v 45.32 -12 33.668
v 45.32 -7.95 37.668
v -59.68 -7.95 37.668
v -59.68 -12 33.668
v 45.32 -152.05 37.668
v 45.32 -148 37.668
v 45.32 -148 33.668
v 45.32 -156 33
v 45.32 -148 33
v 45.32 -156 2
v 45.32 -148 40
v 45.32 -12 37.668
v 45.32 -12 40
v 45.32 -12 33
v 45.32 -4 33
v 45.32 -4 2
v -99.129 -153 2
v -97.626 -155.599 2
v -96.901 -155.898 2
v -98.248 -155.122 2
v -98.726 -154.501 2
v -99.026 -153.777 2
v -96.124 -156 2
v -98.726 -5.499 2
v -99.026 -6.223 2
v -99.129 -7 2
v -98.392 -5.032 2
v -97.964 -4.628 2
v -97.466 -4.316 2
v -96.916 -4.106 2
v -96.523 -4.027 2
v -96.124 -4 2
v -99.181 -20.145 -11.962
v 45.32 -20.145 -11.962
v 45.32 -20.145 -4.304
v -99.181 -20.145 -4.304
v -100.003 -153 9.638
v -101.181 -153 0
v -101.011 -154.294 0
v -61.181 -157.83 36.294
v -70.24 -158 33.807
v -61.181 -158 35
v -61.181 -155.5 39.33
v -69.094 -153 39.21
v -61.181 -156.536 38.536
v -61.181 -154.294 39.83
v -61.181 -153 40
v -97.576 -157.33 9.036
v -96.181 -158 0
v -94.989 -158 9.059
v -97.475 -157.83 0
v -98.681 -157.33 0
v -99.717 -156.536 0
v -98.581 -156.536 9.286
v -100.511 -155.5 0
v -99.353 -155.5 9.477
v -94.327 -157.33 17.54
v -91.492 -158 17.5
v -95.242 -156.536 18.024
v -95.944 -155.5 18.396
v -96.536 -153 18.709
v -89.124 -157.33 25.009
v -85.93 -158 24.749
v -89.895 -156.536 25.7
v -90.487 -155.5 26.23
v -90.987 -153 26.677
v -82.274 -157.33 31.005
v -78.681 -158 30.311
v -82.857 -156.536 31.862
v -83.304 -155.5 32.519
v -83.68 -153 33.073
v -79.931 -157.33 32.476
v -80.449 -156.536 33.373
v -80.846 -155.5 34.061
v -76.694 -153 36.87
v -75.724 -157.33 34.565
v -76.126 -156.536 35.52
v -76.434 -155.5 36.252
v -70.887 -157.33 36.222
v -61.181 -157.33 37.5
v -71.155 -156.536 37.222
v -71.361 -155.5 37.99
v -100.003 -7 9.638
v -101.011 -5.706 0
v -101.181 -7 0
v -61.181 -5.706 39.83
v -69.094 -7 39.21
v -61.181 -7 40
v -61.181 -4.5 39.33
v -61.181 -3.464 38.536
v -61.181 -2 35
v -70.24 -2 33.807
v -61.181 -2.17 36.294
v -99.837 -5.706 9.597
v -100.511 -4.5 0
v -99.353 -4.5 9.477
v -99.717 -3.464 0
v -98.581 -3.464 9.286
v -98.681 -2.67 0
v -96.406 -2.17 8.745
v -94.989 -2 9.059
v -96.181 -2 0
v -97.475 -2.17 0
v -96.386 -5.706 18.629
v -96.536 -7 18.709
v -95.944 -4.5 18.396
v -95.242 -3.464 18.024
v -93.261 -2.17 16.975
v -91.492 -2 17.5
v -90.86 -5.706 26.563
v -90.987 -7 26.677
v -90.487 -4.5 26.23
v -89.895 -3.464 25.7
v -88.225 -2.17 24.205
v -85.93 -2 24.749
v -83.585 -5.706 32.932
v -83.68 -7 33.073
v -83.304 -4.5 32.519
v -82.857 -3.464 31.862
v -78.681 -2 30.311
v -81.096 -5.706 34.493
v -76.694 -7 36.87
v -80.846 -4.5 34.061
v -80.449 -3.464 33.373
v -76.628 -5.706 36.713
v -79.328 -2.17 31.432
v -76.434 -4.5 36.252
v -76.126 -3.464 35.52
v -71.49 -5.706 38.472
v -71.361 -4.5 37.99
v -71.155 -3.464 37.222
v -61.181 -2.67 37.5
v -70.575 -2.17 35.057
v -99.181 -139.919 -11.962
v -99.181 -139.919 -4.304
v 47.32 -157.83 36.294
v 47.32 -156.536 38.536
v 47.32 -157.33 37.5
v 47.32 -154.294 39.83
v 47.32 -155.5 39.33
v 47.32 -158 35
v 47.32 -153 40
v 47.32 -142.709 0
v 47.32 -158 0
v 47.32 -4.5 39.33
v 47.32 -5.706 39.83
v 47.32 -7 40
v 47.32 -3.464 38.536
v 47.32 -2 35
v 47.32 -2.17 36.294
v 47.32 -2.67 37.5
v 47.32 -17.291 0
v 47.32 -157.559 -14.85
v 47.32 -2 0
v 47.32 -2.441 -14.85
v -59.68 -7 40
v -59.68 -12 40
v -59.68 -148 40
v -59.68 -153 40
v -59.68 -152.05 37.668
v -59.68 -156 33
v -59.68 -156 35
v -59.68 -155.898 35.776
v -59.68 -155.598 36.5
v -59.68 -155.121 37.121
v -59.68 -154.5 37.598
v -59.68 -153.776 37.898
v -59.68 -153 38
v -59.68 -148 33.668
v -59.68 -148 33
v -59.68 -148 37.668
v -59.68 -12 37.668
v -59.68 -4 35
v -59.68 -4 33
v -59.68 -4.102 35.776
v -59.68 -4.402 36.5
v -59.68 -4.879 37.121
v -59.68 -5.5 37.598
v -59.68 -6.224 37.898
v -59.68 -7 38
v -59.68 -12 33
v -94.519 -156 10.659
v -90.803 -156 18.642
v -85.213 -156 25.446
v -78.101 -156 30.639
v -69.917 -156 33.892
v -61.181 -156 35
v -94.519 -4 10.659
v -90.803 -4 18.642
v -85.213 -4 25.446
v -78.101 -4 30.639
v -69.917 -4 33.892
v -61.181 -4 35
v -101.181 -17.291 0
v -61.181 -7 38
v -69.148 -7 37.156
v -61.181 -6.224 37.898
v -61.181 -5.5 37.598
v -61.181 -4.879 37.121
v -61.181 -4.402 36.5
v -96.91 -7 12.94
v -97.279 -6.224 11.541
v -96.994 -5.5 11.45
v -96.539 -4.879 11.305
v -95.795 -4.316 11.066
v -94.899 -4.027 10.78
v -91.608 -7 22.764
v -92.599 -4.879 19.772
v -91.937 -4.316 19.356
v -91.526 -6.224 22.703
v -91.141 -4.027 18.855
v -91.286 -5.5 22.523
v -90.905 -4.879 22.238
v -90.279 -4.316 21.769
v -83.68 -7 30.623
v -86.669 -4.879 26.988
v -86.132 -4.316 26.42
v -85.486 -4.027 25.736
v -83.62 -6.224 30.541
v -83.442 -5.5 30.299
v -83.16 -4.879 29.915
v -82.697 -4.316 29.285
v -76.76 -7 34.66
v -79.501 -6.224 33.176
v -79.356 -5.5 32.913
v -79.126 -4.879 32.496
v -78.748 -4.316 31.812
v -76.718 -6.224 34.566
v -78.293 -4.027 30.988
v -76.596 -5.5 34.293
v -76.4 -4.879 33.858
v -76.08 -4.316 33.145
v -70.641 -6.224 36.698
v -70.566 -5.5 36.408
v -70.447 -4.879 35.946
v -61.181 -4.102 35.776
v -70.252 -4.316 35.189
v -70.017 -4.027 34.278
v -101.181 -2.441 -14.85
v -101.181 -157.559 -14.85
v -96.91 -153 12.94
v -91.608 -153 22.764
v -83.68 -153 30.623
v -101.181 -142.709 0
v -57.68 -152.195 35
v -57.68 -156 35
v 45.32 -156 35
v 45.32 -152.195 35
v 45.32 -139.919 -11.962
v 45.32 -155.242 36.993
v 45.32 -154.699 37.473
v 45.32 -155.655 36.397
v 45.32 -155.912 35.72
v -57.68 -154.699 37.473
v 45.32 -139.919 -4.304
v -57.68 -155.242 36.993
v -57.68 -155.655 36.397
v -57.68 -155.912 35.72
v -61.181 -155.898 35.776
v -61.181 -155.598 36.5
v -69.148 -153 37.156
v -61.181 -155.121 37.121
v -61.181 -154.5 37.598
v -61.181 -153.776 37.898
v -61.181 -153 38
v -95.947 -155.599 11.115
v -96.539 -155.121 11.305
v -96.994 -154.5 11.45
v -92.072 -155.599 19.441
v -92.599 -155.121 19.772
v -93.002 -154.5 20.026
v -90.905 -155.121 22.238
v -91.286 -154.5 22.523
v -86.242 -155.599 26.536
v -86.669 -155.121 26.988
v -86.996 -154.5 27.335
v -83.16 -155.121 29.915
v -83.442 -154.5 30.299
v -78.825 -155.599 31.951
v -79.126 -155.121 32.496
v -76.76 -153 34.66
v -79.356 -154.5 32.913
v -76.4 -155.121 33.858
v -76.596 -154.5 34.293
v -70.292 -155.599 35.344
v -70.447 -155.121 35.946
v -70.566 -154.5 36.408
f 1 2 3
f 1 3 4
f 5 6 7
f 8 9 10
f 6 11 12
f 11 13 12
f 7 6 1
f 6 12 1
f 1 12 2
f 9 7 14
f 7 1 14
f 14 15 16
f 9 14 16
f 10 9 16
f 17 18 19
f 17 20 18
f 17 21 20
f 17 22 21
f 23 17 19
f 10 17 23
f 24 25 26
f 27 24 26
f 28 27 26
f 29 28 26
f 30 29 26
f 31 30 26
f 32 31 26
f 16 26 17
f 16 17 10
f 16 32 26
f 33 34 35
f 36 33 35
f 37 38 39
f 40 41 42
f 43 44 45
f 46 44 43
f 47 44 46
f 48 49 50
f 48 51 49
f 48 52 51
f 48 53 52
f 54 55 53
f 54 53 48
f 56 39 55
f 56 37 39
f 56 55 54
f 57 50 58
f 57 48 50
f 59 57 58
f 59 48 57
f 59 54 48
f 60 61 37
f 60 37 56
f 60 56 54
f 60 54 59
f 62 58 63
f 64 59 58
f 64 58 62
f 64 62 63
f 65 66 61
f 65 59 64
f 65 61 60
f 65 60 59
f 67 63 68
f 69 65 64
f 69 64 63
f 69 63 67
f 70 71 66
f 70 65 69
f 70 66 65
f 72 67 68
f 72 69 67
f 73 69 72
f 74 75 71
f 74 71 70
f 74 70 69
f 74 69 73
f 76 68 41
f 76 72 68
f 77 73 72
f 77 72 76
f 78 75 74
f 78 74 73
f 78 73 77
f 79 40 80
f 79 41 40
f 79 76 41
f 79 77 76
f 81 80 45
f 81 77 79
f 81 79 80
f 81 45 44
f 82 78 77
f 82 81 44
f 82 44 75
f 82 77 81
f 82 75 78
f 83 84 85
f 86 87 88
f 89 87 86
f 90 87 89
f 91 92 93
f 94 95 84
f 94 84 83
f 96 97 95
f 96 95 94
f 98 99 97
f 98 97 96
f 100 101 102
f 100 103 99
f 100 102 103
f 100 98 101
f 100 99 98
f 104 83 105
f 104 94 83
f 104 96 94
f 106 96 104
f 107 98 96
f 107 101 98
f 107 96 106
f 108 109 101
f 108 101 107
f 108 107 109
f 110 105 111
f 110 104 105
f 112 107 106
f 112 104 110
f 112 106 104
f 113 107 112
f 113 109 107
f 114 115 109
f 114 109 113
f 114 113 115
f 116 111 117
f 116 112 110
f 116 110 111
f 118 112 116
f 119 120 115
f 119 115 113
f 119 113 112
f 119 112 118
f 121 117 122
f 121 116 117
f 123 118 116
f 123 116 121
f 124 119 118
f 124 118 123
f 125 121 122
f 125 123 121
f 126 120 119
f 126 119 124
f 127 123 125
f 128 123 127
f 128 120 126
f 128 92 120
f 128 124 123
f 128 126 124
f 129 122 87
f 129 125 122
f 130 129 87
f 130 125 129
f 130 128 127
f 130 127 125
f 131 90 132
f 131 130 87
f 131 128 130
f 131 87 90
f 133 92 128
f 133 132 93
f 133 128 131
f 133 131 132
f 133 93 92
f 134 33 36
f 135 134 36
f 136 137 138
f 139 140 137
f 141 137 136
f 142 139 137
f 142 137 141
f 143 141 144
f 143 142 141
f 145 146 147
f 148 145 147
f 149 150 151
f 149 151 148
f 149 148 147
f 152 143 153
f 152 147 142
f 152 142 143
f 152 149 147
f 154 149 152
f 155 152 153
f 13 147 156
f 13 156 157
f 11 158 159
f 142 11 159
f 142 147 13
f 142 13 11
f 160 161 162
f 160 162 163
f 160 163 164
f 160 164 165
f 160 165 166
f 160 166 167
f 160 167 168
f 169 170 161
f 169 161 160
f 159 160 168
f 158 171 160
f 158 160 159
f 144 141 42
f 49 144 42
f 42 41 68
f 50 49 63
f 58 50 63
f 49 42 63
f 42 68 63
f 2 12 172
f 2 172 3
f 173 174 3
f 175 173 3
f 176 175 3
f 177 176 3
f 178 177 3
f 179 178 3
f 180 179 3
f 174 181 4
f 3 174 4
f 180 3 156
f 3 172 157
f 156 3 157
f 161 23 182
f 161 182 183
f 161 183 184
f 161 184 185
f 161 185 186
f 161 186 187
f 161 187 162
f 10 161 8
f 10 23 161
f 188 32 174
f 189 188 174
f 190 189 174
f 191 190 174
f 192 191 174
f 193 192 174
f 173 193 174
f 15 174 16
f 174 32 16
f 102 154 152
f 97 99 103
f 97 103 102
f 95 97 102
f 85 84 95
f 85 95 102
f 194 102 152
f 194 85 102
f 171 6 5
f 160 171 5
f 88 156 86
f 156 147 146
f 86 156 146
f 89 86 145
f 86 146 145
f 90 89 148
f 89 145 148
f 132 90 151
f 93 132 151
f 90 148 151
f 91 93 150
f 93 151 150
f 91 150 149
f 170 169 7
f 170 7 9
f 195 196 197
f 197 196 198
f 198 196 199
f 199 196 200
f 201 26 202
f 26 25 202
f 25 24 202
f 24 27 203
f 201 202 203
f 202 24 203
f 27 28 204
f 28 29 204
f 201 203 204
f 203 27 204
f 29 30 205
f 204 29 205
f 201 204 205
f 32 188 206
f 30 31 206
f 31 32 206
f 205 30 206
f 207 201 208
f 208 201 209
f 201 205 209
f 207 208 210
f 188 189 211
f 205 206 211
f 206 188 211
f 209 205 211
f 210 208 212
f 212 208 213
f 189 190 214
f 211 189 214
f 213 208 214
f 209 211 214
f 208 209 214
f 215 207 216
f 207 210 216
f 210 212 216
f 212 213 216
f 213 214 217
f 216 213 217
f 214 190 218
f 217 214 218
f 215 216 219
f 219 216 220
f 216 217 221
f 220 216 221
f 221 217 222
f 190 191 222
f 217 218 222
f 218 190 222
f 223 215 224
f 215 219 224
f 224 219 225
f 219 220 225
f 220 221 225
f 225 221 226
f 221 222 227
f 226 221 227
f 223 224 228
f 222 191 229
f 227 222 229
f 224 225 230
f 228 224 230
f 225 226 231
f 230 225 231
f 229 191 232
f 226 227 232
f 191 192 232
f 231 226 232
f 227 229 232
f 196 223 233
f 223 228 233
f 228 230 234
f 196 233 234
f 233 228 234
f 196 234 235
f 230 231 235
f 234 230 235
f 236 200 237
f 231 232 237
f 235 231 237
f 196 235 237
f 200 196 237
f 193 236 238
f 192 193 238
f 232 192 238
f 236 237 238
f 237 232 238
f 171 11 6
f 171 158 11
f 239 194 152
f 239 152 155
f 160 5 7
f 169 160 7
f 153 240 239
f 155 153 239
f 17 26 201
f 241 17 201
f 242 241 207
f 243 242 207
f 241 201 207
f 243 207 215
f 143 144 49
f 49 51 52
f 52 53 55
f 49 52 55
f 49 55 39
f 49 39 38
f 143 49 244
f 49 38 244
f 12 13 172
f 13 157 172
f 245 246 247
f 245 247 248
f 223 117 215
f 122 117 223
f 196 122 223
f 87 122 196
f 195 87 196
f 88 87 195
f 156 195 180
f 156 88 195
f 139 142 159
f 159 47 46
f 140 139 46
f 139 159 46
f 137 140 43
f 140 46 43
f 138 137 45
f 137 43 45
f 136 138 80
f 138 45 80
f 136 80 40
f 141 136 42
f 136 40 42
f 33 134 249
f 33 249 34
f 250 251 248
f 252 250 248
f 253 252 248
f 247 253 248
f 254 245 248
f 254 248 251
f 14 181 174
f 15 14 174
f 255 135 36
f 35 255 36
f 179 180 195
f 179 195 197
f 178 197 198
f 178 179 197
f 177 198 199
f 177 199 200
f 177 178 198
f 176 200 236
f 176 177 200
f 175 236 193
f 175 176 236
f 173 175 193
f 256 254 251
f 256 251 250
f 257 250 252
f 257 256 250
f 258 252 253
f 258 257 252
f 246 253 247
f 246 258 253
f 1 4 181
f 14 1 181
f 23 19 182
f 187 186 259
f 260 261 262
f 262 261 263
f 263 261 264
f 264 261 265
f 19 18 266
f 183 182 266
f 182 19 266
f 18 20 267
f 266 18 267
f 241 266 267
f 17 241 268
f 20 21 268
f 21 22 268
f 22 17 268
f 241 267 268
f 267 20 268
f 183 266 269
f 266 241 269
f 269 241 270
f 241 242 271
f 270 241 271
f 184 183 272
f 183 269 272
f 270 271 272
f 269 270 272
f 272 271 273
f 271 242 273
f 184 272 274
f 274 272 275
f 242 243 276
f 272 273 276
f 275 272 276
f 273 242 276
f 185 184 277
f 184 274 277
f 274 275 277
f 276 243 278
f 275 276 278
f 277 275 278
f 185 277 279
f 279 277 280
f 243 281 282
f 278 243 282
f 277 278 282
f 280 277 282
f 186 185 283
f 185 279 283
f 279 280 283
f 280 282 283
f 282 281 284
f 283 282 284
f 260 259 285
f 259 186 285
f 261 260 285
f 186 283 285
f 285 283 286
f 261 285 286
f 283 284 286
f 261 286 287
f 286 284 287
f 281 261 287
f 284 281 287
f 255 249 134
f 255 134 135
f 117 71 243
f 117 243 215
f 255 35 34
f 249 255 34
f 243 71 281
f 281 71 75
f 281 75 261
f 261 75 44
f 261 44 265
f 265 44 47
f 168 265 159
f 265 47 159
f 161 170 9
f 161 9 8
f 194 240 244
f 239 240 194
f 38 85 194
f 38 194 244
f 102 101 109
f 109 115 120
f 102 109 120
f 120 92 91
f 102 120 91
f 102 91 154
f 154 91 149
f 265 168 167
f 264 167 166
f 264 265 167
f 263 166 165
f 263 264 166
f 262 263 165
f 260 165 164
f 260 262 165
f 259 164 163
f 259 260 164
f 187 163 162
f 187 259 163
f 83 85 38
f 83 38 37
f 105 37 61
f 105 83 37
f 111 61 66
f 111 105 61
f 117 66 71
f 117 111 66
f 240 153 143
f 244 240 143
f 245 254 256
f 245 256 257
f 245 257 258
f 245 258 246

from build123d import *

# Parameters (mm, degrees)
SKETCH1_W            = 148.500856602
SKETCH1_H            = 156
BOSS_EXTRUDE1_DEPTH  = 40
FILLET3_R            = 40
FILLET4_R            = 5
SHELL4_T             = -2
SKETCH19_W           = 131
SKETCH19_H           = 146
CUT_EXTRUDE8_DEPTH   = 10
SKETCH21_W           = 107
SKETCH21_H           = 2
BOSS_EXTRUDE7_DEPTH  = 5
BOSS_EXTRUDE8_START  = -107
BOSS_EXTRUDE8_DEPTH  = 107
CUT_EXTRUDE9_DEPTH   = 107
BOSS_EXTRUDE9_DEPTH  = 2
BOSS_EXTRUDE10_DEPTH = 15
CUT_EXTRUDE10_DEPTH  = 170
SHELL5_START         = -57.680419874
SHELL5_DEPTH         = 103
SKETCH29_W           = 7.658063704
SKETCH29_H           = 119.773909492
CUT_EXTRUDE11_DEPTH  = 170
SKETCH31_W           = 7.658063704
SKETCH31_H           = 119.773909492
BOSS_EXTRUDE12_DEPTH = 2
SKETCH32_W           = 7.658063704
SKETCH32_H           = 119.773909492
BOSS_EXTRUDE13_DEPTH = 2
CUT_EXTRUDE12_DEPTH  = 154


# Read off the part's stored shape, not the designer's step: Shell5
# Some blends are built 0.0001 mm under size
with BuildPart() as part:
    # Sketch1 → Boss-Extrude1 (new body)
    with BuildSketch(Plane.XY):
        with Locations((-26.930848175, -80)):
            Rectangle(SKETCH1_W, SKETCH1_H)
    extrude(amount=BOSS_EXTRUDE1_DEPTH)

    # Fillet3
    fillet3_edges = [part.edges().sort_by_distance(p)[0] for p in [
        (-101.181276476, -80, 40),
    ]]
    fillet(fillet3_edges, radius=FILLET3_R - 0.0001)  # a hair under: the kernel refuses the full size

    # Fillet4
    # the kernel refuses this fillet: 5 mm, written as the material it takes off along each edge
    with BuildSketch(Plane(origin=(-61.181376476, -158, 40), x_dir=(0, 1, 0), z_dir=(1, 0, 0))) as fillet4_piece_1:
        with BuildLine():
            CenterArc((FILLET4_R, -FILLET4_R), FILLET4_R, 90, 90)
            Line((0, -FILLET4_R), (0, 0))
            Line((0, 0), (FILLET4_R, 0))
        make_face()
    extrude(amount=121.000956602, mode=Mode.SUBTRACT)
    with BuildSketch(Plane(origin=(-61.181376476, -158, 0.0001), x_dir=(-1, 0, 0), z_dir=(0, 0, -1))) as fillet4_piece_2:
        with BuildLine():
            CenterArc((39.9999 - FILLET4_R, FILLET4_R), FILLET4_R, 270, 90)
            Line((39.9999 - FILLET4_R, 0), (39.9999, 0))
            Line((39.9999, 0), (39.9999, FILLET4_R))
        make_face()
    revolve(axis=Axis((-61.181376476, -158, 0.0001), (0, 1, 0)), revolution_arc=90, mode=Mode.SUBTRACT)
    with BuildSketch(Plane(origin=(-61.181376476, -2, 0.0001), x_dir=(-1, 0, 0), z_dir=(0, 0, -1))) as fillet4_piece_3:
        with BuildLine():
            CenterArc((39.9999 - FILLET4_R, -FILLET4_R), FILLET4_R, 0, 90)
            Line((39.9999, -FILLET4_R), (39.9999, 0))
            Line((39.9999, 0), (39.9999 - FILLET4_R, 0))
        make_face()
    revolve(axis=Axis((-61.181376476, -2, 0.0001), (0, 1, 0)), revolution_arc=90, mode=Mode.SUBTRACT)
    with BuildSketch(Plane(origin=(59.819580126, -2, 40), x_dir=(0, 0, -1), z_dir=(-1, 0, 0))) as fillet4_piece_4:
        with BuildLine():
            CenterArc((FILLET4_R, FILLET4_R), FILLET4_R, 180, 90)
            Line((0, FILLET4_R), (0, 0))
            Line((0, 0), (FILLET4_R, 0))
        make_face()
    extrude(amount=121.000956602, mode=Mode.SUBTRACT)
    with BuildSketch(Plane(origin=(-101.181276476, -2, -12.5), x_dir=(1, 0, 0), z_dir=(0, 0, 1)), Plane(origin=(-101.181276476, -158, -12.5), x_dir=(0, 1, 0), z_dir=(0, 0, 1))) as fillet4_piece_5:
        with BuildLine():
            CenterArc((FILLET4_R, -FILLET4_R), FILLET4_R, 90, 90)
            Line((0, -FILLET4_R), (0, 0))
            Line((0, 0), (FILLET4_R, 0))
        make_face()
    extrude(amount=12.5001, mode=Mode.SUBTRACT)

    # Shell4
    shell4_openings = [part.faces().sort_by_distance(p)[0] for p in [
        (47.319580126, -80, 19.967473228),
    ]]
    offset(amount=SHELL4_T, openings=shell4_openings)

    # Sketch19 → Cut-Extrude8 (cut)
    with BuildSketch(Plane.XY.offset(40)):
        with Locations((-18.180419874, -80)):
            Rectangle(SKETCH19_W, SKETCH19_H)
    extrude(amount=-CUT_EXTRUDE8_DEPTH, mode=Mode.SUBTRACT)

    # Sketch21 → Boss-Extrude7 (add)
    with BuildSketch(Plane(origin=(0, -153, 0), x_dir=(1, 0, 0), z_dir=(0, 1, 0))):
        with Locations((-6.180419874, -39)):
            Rectangle(SKETCH21_W, SKETCH21_H)
    boss_extrude7 = extrude(amount=BOSS_EXTRUDE7_DEPTH)

    # Sketch22 → Boss-Extrude8 (add)
    with BuildSketch(Plane(origin=(47.319580126, 0, 0), x_dir=(0, 0, -1), z_dir=(1, 0, 0)).offset(BOSS_EXTRUDE8_START)):
        with BuildLine():
            Line((-38, -148), (-33, -148))
            Line((-33, -148), (-33, -156))
            Line((-33, -156), (-35, -156))
            ThreePointArc((-35, -156), (-37.121320344, -155.121320344), (-38, -153))
            Line((-38, -153), (-38, -148))
        make_face()
    boss_extrude8 = extrude(amount=BOSS_EXTRUDE8_DEPTH)

    # Sketch23 → Cut-Extrude9 (cut)
    with BuildSketch(Plane(origin=(47.319580126, 0, 0), x_dir=(0, 0, -1), z_dir=(1, 0, 0))):
        Polygon((-37.667948512, -148), (-37.667948512, -152.05), (-33.667948512, -148), align=None)
    cut_extrude9 = extrude(amount=-CUT_EXTRUDE9_DEPTH, mode=Mode.SUBTRACT)

    # Mirror1: Boss-Extrude7, Boss-Extrude8, Cut-Extrude9 across plane
    add(boss_extrude7.mirror(Plane.ZX.offset(-80)))
    add(boss_extrude8.mirror(Plane.ZX.offset(-80)))
    add(cut_extrude9.mirror(Plane.ZX.offset(-80)), mode=Mode.SUBTRACT)

    # Sketch25 → Boss-Extrude9 (add)
    with BuildSketch(Plane(origin=(47.319580126, 0, 0), x_dir=(0, 0, -1), z_dir=(1, 0, 0))):
        Polygon((-40, -148), (-37.667948512, -148), (-37.667948512, -152.05), (-33.667948512, -148), (-33, -148), (-33, -156), (-2, -156), (-2, -4), (-33, -4), (-33, -12), (-33.667948512, -12), (-37.667948512, -7.95), (-37.667948512, -12), (-40, -12), align=None)
    extrude(amount=-BOSS_EXTRUDE9_DEPTH)

    # Sketch26 → Boss-Extrude10 (add)
    with BuildSketch(Plane(origin=(0, 0, 0), x_dir=(-1, 0, 0), z_dir=(0, 0, -1))):
        Polygon((101.181276476, -7), (101.181276476, -153), (101.181276476, -158), (96.181276476, -158), (-47.319580126, -158), (-47.319580126, -2), (96.181276476, -2), (101.181276476, -2), align=None)
    extrude(amount=BOSS_EXTRUDE10_DEPTH)

    # Sketch27 → Cut-Extrude10 (cut)
    with BuildSketch(Plane.ZY.offset(101.181276476)):
        Polygon((-15.241421356, -1.9), (0, -1.9), (0, -2), (0, -17), (0, -17.141421356), align=None)
        Polygon((0, -142.858578644), (-15.241421356, -158.1), (0, -158.1), (0, -158), (0, -143), align=None)
    extrude(amount=-CUT_EXTRUDE10_DEPTH, mode=Mode.SUBTRACT)

    # Shell5 outline → Shell5 (cut)
    with BuildSketch(Plane.YZ.offset(SHELL5_START)):
        with BuildLine():
            Line((-152.194861825, 35), (-154.69858558, 37.472813585))
            ThreePointArc((-154.69858558, 37.472813585), (-155.654784053, 36.397183463), (-156, 35))
            Line((-156, 35), (-152.194861825, 35))
        make_face()
    extrude(amount=SHELL5_DEPTH, mode=Mode.SUBTRACT)

    # Sketch29 → Cut-Extrude11 (cut)
    with BuildSketch(Plane.ZY.offset(101.181276476)):
        with Locations((-8.13310084, -80.031899357)):
            Rectangle(SKETCH29_W, SKETCH29_H)
    extrude(amount=-CUT_EXTRUDE11_DEPTH, mode=Mode.SUBTRACT)

    # Sketch31 → Boss-Extrude12 (add)
    with BuildSketch(Plane(origin=(47.319580126, 0, 0), x_dir=(0, 0, -1), z_dir=(1, 0, 0))):
        with Locations((8.13310084, -80.031899357)):
            Rectangle(SKETCH31_W, SKETCH31_H)
    extrude(amount=-BOSS_EXTRUDE12_DEPTH)

    # Sketch32 → Boss-Extrude13 (add)
    with BuildSketch(Plane.ZY.offset(101.181276476)):
        with Locations((-8.13310084, -80.031899357)):
            Rectangle(SKETCH32_W, SKETCH32_H)
    extrude(amount=-BOSS_EXTRUDE13_DEPTH)

    # Sketch33 → Cut-Extrude12 (cut)
    with BuildSketch(Plane.ZY.offset(101.181276476)):
        Polygon((0, -17.141421356), (0, -17.291421356), (-14.85, -2.441421356), (-14.85, -13.62364303), (-14.85, -146.37635697), (-14.85, -157.558578644), (0, -142.708578644), (0, -142.858578644), (-15, -157.858578644), (-15, -2.141421356), align=None)
    extrude(amount=-CUT_EXTRUDE12_DEPTH, mode=Mode.SUBTRACT)


solid = part.part
